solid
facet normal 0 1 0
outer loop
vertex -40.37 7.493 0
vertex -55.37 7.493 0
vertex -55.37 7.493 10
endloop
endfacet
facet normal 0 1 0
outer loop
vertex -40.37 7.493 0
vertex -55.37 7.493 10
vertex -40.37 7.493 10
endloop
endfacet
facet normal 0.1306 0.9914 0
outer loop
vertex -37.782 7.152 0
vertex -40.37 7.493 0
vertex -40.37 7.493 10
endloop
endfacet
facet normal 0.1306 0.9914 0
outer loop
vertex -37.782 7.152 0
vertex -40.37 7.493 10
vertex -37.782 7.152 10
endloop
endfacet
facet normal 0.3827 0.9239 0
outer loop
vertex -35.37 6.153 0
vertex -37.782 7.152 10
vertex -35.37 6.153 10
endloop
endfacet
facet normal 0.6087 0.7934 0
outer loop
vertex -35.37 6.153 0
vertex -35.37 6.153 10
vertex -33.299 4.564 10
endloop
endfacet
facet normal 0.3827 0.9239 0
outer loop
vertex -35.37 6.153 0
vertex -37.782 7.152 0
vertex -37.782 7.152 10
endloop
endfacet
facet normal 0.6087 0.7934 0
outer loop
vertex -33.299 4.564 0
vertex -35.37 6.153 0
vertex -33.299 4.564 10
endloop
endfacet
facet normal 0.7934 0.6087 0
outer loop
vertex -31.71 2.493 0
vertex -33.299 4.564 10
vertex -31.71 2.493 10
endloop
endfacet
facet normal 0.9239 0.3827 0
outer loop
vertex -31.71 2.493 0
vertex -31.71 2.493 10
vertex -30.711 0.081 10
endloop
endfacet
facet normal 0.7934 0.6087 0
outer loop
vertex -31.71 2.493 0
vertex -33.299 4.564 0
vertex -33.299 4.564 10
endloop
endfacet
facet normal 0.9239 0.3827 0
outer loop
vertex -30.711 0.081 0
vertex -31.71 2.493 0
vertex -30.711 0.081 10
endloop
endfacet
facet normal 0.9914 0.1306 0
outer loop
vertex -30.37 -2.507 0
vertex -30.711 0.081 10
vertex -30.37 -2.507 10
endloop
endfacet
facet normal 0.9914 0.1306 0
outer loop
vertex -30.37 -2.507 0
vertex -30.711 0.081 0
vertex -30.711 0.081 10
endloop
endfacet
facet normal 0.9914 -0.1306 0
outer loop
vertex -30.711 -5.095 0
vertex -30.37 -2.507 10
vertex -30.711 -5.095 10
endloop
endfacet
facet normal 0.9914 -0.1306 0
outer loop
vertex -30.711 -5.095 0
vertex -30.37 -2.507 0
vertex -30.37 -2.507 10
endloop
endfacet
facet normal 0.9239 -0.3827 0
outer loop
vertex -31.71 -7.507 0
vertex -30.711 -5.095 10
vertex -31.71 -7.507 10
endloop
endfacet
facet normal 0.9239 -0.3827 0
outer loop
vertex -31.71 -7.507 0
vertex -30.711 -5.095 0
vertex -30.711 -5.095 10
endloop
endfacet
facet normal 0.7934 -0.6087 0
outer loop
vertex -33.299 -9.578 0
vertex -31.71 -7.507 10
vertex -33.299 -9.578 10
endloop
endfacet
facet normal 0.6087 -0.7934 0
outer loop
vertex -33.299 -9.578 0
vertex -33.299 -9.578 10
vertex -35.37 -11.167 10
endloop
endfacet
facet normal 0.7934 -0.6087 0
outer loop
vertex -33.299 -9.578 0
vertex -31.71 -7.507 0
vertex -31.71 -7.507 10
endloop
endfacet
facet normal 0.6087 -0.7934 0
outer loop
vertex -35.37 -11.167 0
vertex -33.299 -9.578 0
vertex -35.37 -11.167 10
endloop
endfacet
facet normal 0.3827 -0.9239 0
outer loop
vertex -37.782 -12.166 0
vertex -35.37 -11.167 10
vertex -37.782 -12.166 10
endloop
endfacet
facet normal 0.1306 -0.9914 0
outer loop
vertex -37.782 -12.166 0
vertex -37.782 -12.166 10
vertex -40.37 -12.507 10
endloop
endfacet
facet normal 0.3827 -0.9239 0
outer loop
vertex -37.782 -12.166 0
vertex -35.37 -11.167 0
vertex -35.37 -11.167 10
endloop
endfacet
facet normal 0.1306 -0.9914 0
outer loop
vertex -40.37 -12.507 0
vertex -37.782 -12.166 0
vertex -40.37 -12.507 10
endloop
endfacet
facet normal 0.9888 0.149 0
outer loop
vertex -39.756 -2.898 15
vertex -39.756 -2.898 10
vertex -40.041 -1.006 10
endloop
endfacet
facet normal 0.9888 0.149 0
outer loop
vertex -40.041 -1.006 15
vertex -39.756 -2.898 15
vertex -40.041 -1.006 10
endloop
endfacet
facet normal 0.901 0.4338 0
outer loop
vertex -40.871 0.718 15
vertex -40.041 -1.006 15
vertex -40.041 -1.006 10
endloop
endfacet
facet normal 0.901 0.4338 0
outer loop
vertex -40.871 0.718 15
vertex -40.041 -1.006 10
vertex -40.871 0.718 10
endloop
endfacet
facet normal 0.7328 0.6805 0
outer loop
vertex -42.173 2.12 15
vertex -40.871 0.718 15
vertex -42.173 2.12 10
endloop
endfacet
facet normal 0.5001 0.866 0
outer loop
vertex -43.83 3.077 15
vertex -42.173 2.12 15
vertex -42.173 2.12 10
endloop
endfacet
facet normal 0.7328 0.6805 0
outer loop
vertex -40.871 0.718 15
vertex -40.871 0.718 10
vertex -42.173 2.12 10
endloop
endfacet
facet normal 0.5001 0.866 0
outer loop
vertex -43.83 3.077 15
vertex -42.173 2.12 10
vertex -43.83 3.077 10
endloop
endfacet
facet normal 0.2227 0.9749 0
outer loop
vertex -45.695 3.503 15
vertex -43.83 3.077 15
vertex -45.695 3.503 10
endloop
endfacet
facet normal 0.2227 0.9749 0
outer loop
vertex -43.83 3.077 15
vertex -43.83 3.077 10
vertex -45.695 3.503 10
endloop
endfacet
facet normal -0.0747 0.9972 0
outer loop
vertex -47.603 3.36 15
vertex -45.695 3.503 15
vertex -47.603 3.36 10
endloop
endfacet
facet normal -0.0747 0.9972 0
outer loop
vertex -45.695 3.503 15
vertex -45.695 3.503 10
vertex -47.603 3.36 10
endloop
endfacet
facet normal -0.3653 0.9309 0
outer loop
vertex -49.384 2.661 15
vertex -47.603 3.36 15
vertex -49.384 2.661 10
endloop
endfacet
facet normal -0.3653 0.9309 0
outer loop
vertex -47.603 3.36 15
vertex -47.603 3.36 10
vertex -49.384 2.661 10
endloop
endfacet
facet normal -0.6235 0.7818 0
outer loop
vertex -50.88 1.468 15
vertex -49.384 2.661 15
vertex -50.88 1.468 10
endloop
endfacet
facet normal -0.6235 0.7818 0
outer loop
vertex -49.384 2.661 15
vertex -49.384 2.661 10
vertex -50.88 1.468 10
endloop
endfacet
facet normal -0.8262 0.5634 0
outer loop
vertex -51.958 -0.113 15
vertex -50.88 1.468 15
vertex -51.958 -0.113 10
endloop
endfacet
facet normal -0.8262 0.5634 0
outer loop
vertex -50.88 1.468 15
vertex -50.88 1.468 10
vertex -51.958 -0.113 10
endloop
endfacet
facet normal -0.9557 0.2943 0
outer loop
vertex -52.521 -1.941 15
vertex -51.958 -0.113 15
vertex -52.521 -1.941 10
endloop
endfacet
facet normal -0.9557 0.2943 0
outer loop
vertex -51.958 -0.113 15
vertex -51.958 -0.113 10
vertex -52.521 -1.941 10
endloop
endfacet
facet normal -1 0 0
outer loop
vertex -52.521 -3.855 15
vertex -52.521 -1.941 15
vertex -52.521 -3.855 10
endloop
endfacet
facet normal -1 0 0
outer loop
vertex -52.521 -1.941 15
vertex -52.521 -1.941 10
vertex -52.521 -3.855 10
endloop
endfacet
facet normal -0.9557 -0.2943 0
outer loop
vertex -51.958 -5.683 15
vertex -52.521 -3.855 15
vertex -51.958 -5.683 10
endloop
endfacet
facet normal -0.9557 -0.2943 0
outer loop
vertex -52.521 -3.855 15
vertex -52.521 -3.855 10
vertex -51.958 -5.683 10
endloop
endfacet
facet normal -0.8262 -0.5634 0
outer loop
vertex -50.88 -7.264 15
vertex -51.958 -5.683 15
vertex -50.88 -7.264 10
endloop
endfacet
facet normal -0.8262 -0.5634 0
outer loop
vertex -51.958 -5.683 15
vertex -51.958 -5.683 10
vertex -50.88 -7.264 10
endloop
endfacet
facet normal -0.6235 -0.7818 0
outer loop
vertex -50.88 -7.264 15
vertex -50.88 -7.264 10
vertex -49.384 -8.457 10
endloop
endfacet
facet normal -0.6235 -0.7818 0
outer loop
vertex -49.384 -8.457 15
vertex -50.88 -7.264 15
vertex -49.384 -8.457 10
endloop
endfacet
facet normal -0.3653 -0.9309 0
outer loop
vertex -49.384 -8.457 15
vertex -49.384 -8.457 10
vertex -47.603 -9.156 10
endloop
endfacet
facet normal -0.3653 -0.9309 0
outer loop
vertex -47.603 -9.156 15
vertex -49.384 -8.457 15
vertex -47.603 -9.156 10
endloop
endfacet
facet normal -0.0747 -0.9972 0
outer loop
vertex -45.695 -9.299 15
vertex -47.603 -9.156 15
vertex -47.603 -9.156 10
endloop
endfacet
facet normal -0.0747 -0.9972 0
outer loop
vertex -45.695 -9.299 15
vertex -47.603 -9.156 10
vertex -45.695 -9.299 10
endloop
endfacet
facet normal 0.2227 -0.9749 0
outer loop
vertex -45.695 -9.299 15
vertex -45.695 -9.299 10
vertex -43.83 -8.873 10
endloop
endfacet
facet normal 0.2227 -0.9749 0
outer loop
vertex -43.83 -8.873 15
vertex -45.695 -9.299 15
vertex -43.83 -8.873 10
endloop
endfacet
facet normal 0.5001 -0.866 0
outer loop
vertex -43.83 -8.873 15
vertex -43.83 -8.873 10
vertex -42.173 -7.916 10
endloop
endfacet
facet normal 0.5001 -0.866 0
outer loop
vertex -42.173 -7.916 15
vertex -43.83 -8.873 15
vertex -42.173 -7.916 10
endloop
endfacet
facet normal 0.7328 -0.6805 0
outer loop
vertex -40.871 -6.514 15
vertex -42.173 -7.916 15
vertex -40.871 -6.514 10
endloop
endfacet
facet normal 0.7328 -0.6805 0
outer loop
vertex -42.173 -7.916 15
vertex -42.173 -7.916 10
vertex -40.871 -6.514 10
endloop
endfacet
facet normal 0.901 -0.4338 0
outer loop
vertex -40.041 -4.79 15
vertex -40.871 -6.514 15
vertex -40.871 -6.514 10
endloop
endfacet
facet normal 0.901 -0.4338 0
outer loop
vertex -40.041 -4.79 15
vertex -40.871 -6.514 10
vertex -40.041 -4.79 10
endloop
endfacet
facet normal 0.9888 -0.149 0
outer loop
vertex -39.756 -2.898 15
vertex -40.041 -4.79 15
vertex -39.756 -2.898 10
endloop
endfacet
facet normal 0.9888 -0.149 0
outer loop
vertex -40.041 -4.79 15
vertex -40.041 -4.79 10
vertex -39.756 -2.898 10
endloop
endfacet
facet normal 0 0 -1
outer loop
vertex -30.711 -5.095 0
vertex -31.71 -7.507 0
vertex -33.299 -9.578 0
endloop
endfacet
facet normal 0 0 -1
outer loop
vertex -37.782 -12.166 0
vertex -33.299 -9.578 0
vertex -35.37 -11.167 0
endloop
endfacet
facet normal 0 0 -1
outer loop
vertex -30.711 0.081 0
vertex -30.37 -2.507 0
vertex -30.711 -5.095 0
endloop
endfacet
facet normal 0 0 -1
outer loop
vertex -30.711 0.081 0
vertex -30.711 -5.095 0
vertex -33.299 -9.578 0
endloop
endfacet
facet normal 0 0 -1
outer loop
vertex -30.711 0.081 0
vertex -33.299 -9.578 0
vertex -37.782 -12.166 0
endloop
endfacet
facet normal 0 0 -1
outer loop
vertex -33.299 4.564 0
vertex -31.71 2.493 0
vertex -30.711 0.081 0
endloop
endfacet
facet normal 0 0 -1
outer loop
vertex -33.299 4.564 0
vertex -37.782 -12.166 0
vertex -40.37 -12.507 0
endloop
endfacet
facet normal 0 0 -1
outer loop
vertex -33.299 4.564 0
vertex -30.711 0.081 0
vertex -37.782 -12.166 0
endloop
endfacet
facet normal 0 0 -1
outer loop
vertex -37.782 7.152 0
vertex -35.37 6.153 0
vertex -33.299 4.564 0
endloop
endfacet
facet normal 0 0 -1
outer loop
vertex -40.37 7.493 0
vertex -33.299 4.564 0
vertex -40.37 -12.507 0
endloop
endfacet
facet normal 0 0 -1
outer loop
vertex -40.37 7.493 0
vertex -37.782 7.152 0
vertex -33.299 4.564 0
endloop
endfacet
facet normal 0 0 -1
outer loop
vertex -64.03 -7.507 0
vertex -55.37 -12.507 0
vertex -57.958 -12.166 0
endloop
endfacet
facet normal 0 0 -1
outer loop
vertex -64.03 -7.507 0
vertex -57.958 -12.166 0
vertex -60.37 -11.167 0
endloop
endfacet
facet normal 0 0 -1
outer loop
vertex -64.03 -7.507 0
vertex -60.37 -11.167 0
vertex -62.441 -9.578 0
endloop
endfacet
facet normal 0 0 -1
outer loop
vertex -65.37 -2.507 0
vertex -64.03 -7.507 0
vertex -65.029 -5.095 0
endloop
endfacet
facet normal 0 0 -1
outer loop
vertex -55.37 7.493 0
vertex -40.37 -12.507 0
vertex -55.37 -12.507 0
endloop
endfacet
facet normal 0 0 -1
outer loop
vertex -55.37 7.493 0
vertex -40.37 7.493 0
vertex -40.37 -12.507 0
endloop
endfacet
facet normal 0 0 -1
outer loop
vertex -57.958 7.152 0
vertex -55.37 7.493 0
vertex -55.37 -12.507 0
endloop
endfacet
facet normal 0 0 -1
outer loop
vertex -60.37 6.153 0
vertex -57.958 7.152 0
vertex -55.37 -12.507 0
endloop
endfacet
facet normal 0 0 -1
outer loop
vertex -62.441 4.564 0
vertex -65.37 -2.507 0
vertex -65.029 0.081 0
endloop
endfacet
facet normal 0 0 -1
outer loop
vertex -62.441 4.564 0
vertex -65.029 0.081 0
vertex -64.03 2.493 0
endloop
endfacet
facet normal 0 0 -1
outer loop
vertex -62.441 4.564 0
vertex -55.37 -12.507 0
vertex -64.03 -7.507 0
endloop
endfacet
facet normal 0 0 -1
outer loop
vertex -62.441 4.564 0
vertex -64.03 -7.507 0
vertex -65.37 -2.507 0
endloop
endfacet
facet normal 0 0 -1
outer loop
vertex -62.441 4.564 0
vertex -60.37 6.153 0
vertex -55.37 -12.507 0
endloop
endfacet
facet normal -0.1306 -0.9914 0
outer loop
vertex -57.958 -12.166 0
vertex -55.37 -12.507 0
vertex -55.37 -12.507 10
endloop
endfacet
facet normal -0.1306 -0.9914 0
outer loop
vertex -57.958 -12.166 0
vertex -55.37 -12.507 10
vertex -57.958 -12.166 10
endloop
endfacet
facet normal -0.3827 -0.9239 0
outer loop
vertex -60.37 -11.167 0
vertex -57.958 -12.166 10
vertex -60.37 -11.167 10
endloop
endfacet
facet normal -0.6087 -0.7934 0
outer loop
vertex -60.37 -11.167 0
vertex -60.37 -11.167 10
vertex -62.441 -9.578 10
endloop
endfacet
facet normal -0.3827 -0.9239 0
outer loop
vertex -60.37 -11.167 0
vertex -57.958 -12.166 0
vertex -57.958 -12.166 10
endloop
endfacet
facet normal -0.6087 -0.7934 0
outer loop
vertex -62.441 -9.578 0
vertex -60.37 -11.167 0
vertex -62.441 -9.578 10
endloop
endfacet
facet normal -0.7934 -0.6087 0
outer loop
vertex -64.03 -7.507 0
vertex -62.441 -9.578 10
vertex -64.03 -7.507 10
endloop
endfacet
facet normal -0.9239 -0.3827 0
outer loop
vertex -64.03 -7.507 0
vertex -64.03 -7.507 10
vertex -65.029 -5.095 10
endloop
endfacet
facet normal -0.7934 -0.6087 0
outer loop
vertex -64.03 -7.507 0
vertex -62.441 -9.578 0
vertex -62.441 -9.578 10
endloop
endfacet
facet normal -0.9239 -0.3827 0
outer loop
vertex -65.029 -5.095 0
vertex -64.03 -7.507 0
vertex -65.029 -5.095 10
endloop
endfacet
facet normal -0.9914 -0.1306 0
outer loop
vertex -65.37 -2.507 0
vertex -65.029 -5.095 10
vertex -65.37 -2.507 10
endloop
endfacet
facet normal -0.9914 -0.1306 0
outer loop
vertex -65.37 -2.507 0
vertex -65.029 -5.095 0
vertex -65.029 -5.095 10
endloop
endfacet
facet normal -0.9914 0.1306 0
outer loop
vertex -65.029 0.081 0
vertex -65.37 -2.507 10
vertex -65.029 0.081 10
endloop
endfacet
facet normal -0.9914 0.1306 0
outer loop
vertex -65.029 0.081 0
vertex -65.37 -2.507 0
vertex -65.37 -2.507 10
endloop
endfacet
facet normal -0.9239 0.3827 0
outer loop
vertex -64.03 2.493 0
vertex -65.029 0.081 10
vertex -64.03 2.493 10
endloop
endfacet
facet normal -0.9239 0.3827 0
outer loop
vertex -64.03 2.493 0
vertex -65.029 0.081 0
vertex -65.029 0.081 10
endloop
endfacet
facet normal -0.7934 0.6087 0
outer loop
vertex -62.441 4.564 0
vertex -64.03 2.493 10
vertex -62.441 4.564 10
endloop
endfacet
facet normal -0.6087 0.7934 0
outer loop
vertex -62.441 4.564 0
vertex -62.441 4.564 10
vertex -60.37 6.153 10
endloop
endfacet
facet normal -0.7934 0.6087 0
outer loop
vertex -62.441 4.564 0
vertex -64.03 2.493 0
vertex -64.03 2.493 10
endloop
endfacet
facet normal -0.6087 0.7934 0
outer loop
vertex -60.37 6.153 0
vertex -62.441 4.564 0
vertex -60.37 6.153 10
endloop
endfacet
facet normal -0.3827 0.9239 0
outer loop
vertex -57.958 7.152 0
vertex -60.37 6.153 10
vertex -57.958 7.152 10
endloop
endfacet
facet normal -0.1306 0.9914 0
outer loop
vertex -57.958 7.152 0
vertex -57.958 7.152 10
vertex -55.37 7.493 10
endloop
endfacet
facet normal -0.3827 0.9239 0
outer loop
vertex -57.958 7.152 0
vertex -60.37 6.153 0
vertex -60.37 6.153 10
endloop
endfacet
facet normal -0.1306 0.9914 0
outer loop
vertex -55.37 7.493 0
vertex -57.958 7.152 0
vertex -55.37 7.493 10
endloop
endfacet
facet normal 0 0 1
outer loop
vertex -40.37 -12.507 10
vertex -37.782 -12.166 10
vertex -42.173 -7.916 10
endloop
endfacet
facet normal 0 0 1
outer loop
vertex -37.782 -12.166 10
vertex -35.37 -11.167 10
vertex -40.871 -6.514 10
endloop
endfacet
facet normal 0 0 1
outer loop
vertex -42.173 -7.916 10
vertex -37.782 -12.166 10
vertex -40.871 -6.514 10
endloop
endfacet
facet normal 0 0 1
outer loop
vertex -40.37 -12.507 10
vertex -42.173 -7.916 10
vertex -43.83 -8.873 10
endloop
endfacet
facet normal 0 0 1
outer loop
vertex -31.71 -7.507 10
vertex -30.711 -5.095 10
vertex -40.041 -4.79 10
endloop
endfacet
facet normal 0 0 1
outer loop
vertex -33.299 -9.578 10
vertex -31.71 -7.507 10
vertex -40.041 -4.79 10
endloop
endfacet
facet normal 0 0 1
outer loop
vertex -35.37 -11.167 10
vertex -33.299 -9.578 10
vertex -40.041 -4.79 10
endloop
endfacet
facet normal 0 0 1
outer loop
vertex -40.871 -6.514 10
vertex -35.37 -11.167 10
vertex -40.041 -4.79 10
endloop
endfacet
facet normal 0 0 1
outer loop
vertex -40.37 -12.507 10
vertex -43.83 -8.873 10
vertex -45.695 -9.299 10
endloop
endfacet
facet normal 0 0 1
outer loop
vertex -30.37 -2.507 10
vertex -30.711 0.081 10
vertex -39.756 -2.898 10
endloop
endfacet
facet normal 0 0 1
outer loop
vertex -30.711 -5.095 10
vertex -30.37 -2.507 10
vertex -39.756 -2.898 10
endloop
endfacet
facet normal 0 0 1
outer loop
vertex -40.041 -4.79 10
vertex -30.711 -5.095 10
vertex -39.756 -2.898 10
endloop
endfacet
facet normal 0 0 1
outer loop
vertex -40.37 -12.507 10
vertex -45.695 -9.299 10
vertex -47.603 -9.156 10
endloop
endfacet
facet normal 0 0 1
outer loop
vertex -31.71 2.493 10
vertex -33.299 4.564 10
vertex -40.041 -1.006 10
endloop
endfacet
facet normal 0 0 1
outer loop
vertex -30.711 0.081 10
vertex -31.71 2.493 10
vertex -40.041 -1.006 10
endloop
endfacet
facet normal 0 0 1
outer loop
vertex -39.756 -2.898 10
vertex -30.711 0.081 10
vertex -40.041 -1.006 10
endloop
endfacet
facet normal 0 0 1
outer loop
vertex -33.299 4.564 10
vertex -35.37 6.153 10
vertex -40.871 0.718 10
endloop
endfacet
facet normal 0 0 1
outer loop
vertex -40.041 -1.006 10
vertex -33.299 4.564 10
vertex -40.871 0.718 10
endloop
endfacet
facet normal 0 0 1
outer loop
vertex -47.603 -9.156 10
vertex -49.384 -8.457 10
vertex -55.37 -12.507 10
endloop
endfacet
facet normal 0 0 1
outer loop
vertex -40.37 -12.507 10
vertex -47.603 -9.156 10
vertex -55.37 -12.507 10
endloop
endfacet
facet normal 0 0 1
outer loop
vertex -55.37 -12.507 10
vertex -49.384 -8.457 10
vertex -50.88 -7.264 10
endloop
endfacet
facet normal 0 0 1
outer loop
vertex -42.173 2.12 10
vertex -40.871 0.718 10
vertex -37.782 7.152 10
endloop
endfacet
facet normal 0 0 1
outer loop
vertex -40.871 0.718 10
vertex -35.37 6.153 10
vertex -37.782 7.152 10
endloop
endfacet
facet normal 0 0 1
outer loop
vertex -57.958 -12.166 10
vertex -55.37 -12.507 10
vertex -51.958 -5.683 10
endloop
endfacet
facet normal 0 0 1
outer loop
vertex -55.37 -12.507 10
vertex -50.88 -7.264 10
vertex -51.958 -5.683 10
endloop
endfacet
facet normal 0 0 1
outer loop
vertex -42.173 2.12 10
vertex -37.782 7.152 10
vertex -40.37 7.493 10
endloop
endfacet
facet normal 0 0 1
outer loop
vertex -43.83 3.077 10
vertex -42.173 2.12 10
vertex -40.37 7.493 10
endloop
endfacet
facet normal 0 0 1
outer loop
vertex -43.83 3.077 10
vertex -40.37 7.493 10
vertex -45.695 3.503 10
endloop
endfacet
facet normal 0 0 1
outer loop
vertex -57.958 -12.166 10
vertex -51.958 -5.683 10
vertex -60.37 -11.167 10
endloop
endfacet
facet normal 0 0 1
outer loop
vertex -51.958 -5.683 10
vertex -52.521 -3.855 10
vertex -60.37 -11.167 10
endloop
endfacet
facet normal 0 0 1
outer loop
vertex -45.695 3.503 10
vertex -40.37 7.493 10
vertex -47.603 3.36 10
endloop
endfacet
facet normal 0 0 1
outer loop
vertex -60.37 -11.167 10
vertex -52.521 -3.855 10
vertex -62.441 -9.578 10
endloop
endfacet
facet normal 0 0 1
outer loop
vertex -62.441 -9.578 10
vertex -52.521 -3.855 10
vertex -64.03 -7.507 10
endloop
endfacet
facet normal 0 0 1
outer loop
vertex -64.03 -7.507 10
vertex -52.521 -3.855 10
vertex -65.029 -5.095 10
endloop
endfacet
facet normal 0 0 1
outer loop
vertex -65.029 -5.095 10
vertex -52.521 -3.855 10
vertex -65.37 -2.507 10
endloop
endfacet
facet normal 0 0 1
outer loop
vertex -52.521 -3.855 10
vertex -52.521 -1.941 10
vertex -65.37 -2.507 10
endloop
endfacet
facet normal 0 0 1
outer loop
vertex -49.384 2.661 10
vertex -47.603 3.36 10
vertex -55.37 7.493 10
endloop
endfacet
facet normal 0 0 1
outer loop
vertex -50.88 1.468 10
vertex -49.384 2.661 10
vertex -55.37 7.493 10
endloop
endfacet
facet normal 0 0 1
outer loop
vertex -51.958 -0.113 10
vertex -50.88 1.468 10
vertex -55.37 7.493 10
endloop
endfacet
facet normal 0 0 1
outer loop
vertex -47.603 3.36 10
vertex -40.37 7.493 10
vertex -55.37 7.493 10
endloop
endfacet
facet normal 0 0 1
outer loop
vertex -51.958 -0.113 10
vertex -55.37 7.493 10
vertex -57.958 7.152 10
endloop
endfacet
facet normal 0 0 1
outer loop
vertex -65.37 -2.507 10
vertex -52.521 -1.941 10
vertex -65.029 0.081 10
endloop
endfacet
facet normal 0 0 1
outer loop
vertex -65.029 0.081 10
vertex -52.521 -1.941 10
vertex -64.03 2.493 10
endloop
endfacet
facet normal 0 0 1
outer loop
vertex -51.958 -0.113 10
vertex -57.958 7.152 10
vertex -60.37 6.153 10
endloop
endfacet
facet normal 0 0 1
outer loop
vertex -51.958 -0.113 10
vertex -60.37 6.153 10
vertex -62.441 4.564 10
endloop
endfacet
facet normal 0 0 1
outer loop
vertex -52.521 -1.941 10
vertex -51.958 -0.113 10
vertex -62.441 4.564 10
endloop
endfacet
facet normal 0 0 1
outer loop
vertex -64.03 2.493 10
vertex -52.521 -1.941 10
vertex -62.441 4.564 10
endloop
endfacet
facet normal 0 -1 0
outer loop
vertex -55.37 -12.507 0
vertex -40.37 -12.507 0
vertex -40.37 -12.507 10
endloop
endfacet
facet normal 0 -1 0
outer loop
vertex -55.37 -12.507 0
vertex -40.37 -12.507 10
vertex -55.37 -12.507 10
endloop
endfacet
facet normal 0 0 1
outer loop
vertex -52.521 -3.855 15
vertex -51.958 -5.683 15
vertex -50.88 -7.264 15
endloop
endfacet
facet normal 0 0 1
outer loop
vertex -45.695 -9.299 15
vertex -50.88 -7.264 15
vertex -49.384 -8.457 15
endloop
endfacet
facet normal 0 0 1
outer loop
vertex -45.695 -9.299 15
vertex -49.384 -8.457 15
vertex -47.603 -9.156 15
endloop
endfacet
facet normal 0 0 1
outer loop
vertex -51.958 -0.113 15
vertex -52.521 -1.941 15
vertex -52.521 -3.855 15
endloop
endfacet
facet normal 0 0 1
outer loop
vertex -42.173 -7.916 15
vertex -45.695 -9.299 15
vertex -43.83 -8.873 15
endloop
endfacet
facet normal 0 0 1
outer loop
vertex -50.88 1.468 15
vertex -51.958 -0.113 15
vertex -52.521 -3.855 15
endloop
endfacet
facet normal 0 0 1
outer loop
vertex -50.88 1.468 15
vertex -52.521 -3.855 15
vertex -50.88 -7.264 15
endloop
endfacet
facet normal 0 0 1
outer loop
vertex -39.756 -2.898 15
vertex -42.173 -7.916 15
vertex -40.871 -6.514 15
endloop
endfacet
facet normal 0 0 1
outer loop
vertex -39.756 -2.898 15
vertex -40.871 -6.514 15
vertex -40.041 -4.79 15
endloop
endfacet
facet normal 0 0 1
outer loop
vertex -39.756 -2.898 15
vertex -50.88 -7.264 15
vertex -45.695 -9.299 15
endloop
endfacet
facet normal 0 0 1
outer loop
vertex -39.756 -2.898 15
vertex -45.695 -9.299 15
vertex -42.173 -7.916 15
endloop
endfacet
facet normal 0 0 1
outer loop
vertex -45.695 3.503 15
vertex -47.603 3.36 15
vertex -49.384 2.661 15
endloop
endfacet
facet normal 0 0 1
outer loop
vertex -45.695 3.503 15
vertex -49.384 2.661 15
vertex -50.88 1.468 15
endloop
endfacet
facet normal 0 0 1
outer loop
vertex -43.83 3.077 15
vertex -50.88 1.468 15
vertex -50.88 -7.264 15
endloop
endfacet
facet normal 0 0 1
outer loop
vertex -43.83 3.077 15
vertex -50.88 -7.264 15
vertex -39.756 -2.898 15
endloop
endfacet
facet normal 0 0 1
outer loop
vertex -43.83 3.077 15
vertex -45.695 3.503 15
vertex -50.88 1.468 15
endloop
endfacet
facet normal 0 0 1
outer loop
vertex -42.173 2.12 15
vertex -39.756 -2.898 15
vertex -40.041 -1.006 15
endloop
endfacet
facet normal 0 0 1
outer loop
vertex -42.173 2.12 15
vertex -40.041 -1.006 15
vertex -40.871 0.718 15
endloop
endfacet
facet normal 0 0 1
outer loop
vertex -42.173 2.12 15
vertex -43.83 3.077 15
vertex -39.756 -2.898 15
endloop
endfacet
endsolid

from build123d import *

# Parameters (mm, degrees)
SALIENTE_EXTRUIR1_DEPTH = 10
CROQUIS2_R              = 6.418605164
SALIENTE_EXTRUIR2_DEPTH = 5


with BuildPart() as part:
    # Croquis1 → Saliente-Extruir1 (new body)
    with BuildSketch(Plane.XY):
        with BuildLine():
            Line((-55.369792261, 7.493056697), (-40.369792261, 7.493056697))
            ThreePointArc((-40.369792261, 7.493056697), (-30.369792261, -2.506943303), (-40.369792261, -12.506943303))
            Line((-40.369792261, -12.506943303), (-55.369792261, -12.506943303))
            ThreePointArc((-55.369792261, -12.506943303), (-65.369792261, -2.506943303), (-55.369792261, 7.493056697))
        make_face()
    extrude(amount=SALIENTE_EXTRUIR1_DEPTH)

    # Croquis2 → Saliente-Extruir2 (add)
    with BuildSketch(Plane.XY.offset(10)):
        with Locations((-46.174536974, -2.897909692)):
            Circle(CROQUIS2_R)
    extrude(amount=SALIENTE_EXTRUIR2_DEPTH)


solid = part.part
